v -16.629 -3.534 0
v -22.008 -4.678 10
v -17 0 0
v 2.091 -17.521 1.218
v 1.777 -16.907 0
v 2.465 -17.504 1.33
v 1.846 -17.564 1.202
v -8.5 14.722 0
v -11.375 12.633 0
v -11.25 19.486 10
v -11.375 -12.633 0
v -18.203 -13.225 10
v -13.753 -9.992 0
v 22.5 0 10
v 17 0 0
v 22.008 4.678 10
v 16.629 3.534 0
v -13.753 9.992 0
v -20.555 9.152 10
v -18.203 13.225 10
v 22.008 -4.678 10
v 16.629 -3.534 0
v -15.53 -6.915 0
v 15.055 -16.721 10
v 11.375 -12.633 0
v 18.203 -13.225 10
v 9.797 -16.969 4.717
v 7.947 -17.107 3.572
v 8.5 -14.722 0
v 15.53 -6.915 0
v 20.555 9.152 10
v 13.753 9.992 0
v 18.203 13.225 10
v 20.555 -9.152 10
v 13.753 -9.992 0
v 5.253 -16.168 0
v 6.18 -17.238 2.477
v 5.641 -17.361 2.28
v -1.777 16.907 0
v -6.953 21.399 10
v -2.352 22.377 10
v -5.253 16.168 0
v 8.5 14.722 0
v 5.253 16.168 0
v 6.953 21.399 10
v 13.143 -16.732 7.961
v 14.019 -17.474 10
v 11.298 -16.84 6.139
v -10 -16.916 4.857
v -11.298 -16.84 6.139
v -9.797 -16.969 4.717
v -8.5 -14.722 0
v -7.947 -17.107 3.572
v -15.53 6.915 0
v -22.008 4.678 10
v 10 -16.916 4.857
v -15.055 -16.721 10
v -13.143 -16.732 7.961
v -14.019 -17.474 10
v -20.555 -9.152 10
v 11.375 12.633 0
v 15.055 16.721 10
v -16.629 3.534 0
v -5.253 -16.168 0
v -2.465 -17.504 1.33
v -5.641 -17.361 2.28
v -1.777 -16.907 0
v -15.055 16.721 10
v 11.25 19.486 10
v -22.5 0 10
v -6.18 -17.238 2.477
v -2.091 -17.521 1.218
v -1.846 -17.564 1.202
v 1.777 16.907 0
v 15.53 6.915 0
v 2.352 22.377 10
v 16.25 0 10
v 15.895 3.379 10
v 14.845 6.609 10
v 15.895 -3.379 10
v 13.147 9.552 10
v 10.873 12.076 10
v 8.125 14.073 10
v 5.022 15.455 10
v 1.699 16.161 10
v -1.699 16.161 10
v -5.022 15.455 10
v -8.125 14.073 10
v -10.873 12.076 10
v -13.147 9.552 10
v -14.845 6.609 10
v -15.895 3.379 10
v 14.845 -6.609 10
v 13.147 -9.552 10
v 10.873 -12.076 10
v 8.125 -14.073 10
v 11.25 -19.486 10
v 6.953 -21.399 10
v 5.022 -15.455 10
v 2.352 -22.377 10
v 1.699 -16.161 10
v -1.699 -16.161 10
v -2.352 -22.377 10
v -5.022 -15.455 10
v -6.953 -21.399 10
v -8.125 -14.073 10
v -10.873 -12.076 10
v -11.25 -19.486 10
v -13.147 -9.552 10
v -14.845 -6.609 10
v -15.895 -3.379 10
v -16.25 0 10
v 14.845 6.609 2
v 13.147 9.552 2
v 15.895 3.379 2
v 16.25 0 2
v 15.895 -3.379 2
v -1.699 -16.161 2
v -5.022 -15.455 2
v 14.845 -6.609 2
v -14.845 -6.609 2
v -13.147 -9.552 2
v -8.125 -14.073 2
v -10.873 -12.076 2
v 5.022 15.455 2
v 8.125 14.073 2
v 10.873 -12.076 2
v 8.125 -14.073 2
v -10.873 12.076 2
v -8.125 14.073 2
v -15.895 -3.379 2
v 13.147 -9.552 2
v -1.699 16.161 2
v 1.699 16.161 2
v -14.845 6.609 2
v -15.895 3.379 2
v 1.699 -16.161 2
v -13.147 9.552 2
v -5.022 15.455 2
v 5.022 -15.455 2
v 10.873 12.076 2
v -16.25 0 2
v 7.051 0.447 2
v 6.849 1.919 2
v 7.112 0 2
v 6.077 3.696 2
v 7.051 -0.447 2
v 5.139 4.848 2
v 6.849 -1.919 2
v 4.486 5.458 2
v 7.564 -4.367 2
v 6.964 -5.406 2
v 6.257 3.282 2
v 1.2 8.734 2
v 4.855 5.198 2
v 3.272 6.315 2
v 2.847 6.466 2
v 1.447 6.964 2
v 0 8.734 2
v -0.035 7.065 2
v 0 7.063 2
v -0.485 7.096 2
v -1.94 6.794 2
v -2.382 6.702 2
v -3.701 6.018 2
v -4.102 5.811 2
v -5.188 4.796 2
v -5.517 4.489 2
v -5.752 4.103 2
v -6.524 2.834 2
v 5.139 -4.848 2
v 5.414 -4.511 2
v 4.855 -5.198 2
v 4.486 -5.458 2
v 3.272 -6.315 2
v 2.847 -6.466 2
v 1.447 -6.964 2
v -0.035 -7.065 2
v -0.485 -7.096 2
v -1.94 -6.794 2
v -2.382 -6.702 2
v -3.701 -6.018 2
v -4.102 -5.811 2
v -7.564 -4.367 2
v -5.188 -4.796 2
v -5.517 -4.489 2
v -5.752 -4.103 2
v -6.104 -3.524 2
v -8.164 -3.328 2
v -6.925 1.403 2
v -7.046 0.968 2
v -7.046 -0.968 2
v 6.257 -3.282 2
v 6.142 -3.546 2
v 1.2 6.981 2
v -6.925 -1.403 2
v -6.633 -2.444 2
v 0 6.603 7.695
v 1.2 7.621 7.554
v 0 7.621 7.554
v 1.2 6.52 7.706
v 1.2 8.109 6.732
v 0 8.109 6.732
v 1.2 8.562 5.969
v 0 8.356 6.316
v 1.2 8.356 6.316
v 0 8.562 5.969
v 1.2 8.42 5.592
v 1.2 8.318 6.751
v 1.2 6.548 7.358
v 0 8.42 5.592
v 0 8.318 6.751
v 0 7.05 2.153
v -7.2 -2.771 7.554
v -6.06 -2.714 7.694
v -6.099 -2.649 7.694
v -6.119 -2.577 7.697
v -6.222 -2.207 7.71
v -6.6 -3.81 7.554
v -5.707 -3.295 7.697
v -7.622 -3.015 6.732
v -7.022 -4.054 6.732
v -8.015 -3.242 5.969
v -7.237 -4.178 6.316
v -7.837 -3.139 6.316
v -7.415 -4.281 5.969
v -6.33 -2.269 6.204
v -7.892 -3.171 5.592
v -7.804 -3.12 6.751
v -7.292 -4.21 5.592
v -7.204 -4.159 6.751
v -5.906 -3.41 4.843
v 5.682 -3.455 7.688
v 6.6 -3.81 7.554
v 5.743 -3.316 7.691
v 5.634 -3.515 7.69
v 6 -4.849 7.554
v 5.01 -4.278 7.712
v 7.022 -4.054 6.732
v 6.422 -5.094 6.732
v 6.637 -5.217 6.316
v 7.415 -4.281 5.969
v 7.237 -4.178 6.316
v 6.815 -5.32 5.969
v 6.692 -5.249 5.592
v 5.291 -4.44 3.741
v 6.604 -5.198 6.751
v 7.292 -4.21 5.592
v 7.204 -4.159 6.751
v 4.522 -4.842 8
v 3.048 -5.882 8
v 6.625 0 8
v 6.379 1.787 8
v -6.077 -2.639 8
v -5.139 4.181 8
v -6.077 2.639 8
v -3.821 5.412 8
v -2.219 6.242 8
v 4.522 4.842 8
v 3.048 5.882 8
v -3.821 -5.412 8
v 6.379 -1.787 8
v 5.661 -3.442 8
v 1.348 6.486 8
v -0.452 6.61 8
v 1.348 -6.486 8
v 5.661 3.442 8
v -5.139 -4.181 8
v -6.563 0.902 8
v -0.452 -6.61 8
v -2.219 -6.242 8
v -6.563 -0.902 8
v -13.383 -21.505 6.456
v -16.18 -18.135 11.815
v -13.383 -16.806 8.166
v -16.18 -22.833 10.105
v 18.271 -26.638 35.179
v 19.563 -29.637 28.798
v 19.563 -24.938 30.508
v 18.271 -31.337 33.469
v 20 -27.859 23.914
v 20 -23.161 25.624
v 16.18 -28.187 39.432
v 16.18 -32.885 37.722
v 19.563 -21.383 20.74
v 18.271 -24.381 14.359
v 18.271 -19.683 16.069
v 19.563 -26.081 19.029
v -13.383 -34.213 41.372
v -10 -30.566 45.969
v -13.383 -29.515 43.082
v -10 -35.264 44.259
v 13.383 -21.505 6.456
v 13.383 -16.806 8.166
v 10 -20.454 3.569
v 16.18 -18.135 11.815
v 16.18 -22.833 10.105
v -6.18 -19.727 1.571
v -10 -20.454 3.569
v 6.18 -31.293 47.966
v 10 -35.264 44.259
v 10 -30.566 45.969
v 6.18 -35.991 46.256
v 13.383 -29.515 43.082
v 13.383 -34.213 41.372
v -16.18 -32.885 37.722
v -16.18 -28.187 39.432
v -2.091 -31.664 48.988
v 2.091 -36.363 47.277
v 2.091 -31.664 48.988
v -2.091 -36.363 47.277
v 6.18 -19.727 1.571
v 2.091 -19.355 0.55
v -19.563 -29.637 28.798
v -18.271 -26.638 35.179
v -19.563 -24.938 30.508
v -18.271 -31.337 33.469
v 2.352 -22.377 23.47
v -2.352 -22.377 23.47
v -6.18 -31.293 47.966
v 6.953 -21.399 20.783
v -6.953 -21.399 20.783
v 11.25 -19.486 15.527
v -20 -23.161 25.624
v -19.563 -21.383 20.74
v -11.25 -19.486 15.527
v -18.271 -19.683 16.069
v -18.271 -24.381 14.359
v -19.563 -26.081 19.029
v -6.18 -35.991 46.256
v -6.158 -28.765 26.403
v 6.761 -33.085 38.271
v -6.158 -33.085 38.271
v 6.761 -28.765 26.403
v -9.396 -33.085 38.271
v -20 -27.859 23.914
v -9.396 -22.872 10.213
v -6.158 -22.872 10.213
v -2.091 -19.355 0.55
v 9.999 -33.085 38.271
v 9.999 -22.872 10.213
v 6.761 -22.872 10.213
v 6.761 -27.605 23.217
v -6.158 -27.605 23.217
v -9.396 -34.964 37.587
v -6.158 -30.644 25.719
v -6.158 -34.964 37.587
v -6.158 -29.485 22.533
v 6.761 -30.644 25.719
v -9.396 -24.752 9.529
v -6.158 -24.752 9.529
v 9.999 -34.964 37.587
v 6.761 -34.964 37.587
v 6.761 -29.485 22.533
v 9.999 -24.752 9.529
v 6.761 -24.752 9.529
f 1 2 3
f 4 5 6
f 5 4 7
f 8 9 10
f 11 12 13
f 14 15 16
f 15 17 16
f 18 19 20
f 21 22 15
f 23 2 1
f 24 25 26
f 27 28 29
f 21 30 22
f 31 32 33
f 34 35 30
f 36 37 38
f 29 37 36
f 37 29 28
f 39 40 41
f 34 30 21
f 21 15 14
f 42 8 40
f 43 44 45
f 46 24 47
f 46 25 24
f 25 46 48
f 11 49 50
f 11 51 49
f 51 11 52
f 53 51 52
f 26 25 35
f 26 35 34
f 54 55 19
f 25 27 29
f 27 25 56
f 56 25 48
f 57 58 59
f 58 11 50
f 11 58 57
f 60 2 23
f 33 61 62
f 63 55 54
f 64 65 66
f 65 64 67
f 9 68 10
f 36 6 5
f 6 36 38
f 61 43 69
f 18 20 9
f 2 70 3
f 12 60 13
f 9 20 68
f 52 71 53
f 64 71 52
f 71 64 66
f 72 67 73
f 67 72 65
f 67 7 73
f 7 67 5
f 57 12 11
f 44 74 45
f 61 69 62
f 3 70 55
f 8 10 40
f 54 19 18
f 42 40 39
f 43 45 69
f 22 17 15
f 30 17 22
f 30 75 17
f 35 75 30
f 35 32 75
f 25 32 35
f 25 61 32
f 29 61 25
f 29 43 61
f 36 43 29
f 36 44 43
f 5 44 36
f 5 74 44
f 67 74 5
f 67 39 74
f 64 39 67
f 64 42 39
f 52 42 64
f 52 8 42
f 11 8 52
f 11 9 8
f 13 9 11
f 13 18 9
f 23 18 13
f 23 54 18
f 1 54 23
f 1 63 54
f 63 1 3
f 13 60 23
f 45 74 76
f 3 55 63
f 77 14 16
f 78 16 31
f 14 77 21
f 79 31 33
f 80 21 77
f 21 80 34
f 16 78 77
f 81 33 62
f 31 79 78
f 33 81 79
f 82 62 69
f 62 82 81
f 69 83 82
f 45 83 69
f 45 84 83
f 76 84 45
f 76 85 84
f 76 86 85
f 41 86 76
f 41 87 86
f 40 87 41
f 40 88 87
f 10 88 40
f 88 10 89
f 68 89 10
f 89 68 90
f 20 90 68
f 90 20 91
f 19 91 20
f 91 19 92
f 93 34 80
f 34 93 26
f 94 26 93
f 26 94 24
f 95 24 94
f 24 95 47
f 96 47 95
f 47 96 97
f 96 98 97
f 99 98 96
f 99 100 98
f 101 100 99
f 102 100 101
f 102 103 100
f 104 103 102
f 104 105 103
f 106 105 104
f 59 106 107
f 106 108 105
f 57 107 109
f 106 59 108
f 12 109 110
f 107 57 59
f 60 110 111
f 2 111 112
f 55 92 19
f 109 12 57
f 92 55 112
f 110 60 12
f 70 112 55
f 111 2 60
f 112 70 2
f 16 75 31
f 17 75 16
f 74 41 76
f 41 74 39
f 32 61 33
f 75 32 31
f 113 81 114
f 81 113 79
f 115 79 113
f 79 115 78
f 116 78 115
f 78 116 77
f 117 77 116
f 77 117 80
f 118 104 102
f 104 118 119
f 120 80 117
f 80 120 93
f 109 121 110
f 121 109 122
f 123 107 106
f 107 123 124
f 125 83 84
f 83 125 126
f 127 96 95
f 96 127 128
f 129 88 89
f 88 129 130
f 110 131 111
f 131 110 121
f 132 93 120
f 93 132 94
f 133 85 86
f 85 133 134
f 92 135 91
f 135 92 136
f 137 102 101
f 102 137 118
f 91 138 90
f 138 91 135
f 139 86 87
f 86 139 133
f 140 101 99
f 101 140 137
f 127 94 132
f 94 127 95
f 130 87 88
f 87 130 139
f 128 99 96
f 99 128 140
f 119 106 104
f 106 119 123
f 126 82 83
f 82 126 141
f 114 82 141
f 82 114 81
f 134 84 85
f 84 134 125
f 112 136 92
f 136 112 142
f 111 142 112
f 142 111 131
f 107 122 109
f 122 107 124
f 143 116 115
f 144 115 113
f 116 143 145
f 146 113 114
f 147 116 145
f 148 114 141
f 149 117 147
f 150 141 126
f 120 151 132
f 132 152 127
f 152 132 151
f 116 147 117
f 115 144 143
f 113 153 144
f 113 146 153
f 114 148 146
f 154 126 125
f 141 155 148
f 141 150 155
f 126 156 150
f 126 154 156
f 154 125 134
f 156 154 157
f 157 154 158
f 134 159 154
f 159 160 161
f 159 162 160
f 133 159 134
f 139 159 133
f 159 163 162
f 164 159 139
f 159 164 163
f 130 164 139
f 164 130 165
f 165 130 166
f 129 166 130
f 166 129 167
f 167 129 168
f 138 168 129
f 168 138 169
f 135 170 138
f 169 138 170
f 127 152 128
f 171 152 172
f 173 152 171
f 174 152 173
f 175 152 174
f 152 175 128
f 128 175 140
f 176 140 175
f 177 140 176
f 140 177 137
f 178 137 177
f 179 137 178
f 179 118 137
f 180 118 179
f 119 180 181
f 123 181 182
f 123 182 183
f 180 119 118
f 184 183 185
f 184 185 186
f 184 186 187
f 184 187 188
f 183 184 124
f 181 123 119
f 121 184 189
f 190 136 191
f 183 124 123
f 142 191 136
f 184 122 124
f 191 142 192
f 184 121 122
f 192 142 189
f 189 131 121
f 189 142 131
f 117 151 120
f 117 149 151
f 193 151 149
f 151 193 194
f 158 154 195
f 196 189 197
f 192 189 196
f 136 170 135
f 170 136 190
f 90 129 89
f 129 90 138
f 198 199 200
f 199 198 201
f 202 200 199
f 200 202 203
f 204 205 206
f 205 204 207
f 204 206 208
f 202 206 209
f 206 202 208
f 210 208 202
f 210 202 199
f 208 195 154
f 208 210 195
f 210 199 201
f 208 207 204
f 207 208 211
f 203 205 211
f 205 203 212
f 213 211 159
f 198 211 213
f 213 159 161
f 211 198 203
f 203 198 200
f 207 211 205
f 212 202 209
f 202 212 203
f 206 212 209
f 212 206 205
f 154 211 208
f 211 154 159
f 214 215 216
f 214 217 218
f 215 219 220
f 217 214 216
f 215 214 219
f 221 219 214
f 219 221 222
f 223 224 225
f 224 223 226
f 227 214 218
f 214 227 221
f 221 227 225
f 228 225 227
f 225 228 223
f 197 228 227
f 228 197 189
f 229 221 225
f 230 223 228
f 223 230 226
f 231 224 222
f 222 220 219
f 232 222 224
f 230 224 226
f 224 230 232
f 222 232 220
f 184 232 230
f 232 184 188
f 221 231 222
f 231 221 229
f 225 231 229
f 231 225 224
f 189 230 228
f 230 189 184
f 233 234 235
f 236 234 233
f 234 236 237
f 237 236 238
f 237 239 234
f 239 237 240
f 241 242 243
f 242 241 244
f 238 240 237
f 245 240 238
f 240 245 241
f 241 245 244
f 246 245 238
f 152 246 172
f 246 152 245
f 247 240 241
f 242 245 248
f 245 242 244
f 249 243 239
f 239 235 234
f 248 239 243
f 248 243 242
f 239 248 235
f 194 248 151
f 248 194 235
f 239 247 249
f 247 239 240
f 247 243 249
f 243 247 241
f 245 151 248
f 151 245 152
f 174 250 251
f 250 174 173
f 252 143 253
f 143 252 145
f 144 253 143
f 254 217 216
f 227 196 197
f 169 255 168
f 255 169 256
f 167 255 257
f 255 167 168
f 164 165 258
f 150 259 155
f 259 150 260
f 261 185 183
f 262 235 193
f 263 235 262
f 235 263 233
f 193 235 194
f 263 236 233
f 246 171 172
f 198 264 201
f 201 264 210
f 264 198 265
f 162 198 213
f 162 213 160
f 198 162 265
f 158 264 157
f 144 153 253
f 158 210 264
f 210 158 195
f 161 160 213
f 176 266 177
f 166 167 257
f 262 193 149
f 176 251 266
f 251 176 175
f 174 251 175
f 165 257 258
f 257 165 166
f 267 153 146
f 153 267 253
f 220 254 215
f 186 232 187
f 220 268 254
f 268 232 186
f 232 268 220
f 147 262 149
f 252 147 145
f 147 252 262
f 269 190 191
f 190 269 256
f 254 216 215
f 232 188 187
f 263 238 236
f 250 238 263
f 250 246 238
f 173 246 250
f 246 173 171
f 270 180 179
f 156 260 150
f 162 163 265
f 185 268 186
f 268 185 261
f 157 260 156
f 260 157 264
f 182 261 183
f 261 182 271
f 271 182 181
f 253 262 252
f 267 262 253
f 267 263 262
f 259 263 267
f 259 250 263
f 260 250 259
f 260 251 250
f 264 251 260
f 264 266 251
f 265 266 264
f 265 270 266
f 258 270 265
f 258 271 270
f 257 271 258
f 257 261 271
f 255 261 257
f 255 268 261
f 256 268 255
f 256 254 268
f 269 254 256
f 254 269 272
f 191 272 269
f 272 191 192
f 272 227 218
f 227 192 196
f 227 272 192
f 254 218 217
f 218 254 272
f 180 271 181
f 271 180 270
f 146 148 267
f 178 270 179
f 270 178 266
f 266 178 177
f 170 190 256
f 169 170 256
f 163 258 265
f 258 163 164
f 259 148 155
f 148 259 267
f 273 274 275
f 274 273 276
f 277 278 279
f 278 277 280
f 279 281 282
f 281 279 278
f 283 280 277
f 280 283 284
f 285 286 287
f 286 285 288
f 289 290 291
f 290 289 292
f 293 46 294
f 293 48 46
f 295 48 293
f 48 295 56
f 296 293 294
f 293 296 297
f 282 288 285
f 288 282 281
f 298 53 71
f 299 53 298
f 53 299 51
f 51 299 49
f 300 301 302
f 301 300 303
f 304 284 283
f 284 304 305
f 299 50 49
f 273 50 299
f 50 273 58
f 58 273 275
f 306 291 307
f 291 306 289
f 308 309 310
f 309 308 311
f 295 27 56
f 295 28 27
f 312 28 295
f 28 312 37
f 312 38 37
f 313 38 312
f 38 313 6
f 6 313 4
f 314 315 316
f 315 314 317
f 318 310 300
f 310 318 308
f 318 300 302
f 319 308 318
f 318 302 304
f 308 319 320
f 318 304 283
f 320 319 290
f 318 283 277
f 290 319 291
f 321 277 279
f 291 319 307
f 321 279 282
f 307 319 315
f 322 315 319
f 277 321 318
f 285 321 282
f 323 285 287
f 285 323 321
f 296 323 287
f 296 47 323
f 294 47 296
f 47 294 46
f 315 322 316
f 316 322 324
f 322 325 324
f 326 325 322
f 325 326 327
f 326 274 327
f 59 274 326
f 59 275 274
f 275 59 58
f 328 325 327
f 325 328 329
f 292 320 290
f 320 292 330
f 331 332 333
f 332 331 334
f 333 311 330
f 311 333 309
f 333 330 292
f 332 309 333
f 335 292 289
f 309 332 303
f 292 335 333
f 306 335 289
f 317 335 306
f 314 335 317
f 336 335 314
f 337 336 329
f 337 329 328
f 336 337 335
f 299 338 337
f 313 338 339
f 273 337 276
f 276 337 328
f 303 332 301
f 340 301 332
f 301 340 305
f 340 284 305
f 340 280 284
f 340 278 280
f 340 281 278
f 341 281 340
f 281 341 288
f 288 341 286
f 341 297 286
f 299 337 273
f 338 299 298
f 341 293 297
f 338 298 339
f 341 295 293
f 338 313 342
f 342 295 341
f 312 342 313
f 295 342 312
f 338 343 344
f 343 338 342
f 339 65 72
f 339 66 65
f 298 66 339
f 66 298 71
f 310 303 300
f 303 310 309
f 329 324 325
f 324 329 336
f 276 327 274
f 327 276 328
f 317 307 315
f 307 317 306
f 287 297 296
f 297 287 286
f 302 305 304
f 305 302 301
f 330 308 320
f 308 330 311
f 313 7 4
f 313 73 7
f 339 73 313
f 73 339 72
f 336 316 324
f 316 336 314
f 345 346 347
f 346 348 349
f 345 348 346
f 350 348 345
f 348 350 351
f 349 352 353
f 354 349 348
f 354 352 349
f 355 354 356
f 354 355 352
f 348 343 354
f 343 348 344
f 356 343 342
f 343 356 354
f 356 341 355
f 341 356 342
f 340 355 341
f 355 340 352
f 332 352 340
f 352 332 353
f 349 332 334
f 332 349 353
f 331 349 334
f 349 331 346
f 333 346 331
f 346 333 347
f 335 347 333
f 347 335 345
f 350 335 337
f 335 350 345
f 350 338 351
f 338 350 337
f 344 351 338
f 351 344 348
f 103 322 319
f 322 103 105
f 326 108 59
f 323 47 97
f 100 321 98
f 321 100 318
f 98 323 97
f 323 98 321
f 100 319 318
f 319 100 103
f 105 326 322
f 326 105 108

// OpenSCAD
// 
// LittlePeople chair, teeter totter
//

initial = "H"; // [A,B,C,D,E,F,G,H,I,J,K,L,M,N,O,P,Q,R,S,T,U,V,W,X,Y,Z]
toy     = "Chair"; // [Chair, Teeter Totter]

module little_people_base() {
	nub_height = 6;
	nub_angle = 5;
	nub_width  = 1.2;
	
	union() {
		// for Little People Princess style
		difference() {
			cylinder(d1=34, d2=45, h=10);
		
			translate([0,0,2]) 
				cylinder(d=32.5, h=10);
		}
		// for standard Little People
		cylinder(d1=14.55, d2=13.25, h=8);

		rotate([nub_angle, 0, 0])
			translate([0,13.75/2, 0]) 
				union() {

					translate([0, .05, 5.2])
						rotate([90,0,90])
							cylinder(d=4.25, h=nub_width);
					cube([nub_width, 2, nub_height]);
				}
		rotate([nub_angle, 0, 120])
			translate([0,13.75/2, 0]) 
			union() {

					translate([0, .05, 5.2])
						rotate([90,0,90])
							cylinder(d=4.25, h=nub_width);
					cube([nub_width, 2, nub_height]);
				}
		rotate([nub_angle, 0, 240])
			translate([0,13.75/2, 0]) 
			union() {

					translate([0, .05, 5.2])
						rotate([90,0,90])
							cylinder(d=4.25, h=nub_width);
					cube([nub_width, 2, nub_height]);
				}
	}
}


module little_people_negative() {
	union() {
		translate([0,0,10]) 
			cylinder(d=45, h=50);
		
		translate([0,0,2]) 
			cylinder(d=32.5, h=9);
	}
}
/*
cylinder(d=40, h=5);
translate([0,0,3])
	linear_extrude(height = 11, center = true)
		text("A", 20, font="Arial", halign="center", valign="center"); /*, spacing,
     direction, language, script)
*/

if (toy == "Chair") { // [Chair, Teeter Totter]
	// Simple chair back
	union() {
		little_people_base();
		difference() {
			rotate([110,0,0]) 
				translate([0,32,13])
					scale([1,1.25,1])
						union () {
							cylinder(d=40, h=5);
							translate([0,0,4])
								linear_extrude(height = 6, center = true)
									text(initial, 25, font="Arial", halign="center", valign="center");
							 }
			little_people_negative();
		}
	}
}

// Cut away to ease designing
//difference() {
//	cube(30,1);
//	little_people_negative();
//}
//little_people_base();

if (toy == "Teeter Totter") {

	// teeter totter
	translate([-17,-17, 0])
		cube([150, 34, 5]);
	translate([0,0,5]) 
		little_people_base();
	translate([117,0,5])
		little_people_base();

	translate([0,64,0])
		rotate([90,0,0])
		difference() {
			cylinder(d=20, h=34);
			translate([-10,-20,-1])
				cube([20,20,36]);
		}
}
